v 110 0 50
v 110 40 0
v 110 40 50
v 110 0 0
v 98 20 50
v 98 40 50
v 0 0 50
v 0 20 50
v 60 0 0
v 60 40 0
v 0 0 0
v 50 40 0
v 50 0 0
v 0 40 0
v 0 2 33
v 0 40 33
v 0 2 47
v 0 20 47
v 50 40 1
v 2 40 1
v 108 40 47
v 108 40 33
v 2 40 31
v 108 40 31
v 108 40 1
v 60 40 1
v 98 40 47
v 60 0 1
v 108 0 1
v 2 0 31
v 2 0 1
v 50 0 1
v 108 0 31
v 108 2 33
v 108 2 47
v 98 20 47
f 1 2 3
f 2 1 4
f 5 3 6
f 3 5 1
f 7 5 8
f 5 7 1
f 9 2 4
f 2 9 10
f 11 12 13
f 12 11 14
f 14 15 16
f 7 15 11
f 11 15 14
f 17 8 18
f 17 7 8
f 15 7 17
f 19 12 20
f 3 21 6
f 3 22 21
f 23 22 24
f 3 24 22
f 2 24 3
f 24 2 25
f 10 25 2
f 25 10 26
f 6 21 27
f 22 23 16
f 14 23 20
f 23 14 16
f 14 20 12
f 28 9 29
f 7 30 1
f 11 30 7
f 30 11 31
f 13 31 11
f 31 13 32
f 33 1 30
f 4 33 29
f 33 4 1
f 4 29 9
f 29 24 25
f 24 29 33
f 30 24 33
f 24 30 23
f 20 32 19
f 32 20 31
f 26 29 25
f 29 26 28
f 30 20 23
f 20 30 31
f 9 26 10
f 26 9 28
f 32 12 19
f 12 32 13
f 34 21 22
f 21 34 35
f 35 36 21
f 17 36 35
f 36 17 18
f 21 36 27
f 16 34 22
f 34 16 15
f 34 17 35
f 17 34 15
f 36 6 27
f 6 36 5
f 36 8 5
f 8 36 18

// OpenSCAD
difference()
{
	cube([110,40,50]);
	translate([2,-1,1]) cube([106,60,30]);
	translate([50,-1,-1]) cube([10,60,5]);
	translate([-2,2,33]) cube([110,50,14]);
	translate([-12,20,40]) cube([110,50,14]);
}
